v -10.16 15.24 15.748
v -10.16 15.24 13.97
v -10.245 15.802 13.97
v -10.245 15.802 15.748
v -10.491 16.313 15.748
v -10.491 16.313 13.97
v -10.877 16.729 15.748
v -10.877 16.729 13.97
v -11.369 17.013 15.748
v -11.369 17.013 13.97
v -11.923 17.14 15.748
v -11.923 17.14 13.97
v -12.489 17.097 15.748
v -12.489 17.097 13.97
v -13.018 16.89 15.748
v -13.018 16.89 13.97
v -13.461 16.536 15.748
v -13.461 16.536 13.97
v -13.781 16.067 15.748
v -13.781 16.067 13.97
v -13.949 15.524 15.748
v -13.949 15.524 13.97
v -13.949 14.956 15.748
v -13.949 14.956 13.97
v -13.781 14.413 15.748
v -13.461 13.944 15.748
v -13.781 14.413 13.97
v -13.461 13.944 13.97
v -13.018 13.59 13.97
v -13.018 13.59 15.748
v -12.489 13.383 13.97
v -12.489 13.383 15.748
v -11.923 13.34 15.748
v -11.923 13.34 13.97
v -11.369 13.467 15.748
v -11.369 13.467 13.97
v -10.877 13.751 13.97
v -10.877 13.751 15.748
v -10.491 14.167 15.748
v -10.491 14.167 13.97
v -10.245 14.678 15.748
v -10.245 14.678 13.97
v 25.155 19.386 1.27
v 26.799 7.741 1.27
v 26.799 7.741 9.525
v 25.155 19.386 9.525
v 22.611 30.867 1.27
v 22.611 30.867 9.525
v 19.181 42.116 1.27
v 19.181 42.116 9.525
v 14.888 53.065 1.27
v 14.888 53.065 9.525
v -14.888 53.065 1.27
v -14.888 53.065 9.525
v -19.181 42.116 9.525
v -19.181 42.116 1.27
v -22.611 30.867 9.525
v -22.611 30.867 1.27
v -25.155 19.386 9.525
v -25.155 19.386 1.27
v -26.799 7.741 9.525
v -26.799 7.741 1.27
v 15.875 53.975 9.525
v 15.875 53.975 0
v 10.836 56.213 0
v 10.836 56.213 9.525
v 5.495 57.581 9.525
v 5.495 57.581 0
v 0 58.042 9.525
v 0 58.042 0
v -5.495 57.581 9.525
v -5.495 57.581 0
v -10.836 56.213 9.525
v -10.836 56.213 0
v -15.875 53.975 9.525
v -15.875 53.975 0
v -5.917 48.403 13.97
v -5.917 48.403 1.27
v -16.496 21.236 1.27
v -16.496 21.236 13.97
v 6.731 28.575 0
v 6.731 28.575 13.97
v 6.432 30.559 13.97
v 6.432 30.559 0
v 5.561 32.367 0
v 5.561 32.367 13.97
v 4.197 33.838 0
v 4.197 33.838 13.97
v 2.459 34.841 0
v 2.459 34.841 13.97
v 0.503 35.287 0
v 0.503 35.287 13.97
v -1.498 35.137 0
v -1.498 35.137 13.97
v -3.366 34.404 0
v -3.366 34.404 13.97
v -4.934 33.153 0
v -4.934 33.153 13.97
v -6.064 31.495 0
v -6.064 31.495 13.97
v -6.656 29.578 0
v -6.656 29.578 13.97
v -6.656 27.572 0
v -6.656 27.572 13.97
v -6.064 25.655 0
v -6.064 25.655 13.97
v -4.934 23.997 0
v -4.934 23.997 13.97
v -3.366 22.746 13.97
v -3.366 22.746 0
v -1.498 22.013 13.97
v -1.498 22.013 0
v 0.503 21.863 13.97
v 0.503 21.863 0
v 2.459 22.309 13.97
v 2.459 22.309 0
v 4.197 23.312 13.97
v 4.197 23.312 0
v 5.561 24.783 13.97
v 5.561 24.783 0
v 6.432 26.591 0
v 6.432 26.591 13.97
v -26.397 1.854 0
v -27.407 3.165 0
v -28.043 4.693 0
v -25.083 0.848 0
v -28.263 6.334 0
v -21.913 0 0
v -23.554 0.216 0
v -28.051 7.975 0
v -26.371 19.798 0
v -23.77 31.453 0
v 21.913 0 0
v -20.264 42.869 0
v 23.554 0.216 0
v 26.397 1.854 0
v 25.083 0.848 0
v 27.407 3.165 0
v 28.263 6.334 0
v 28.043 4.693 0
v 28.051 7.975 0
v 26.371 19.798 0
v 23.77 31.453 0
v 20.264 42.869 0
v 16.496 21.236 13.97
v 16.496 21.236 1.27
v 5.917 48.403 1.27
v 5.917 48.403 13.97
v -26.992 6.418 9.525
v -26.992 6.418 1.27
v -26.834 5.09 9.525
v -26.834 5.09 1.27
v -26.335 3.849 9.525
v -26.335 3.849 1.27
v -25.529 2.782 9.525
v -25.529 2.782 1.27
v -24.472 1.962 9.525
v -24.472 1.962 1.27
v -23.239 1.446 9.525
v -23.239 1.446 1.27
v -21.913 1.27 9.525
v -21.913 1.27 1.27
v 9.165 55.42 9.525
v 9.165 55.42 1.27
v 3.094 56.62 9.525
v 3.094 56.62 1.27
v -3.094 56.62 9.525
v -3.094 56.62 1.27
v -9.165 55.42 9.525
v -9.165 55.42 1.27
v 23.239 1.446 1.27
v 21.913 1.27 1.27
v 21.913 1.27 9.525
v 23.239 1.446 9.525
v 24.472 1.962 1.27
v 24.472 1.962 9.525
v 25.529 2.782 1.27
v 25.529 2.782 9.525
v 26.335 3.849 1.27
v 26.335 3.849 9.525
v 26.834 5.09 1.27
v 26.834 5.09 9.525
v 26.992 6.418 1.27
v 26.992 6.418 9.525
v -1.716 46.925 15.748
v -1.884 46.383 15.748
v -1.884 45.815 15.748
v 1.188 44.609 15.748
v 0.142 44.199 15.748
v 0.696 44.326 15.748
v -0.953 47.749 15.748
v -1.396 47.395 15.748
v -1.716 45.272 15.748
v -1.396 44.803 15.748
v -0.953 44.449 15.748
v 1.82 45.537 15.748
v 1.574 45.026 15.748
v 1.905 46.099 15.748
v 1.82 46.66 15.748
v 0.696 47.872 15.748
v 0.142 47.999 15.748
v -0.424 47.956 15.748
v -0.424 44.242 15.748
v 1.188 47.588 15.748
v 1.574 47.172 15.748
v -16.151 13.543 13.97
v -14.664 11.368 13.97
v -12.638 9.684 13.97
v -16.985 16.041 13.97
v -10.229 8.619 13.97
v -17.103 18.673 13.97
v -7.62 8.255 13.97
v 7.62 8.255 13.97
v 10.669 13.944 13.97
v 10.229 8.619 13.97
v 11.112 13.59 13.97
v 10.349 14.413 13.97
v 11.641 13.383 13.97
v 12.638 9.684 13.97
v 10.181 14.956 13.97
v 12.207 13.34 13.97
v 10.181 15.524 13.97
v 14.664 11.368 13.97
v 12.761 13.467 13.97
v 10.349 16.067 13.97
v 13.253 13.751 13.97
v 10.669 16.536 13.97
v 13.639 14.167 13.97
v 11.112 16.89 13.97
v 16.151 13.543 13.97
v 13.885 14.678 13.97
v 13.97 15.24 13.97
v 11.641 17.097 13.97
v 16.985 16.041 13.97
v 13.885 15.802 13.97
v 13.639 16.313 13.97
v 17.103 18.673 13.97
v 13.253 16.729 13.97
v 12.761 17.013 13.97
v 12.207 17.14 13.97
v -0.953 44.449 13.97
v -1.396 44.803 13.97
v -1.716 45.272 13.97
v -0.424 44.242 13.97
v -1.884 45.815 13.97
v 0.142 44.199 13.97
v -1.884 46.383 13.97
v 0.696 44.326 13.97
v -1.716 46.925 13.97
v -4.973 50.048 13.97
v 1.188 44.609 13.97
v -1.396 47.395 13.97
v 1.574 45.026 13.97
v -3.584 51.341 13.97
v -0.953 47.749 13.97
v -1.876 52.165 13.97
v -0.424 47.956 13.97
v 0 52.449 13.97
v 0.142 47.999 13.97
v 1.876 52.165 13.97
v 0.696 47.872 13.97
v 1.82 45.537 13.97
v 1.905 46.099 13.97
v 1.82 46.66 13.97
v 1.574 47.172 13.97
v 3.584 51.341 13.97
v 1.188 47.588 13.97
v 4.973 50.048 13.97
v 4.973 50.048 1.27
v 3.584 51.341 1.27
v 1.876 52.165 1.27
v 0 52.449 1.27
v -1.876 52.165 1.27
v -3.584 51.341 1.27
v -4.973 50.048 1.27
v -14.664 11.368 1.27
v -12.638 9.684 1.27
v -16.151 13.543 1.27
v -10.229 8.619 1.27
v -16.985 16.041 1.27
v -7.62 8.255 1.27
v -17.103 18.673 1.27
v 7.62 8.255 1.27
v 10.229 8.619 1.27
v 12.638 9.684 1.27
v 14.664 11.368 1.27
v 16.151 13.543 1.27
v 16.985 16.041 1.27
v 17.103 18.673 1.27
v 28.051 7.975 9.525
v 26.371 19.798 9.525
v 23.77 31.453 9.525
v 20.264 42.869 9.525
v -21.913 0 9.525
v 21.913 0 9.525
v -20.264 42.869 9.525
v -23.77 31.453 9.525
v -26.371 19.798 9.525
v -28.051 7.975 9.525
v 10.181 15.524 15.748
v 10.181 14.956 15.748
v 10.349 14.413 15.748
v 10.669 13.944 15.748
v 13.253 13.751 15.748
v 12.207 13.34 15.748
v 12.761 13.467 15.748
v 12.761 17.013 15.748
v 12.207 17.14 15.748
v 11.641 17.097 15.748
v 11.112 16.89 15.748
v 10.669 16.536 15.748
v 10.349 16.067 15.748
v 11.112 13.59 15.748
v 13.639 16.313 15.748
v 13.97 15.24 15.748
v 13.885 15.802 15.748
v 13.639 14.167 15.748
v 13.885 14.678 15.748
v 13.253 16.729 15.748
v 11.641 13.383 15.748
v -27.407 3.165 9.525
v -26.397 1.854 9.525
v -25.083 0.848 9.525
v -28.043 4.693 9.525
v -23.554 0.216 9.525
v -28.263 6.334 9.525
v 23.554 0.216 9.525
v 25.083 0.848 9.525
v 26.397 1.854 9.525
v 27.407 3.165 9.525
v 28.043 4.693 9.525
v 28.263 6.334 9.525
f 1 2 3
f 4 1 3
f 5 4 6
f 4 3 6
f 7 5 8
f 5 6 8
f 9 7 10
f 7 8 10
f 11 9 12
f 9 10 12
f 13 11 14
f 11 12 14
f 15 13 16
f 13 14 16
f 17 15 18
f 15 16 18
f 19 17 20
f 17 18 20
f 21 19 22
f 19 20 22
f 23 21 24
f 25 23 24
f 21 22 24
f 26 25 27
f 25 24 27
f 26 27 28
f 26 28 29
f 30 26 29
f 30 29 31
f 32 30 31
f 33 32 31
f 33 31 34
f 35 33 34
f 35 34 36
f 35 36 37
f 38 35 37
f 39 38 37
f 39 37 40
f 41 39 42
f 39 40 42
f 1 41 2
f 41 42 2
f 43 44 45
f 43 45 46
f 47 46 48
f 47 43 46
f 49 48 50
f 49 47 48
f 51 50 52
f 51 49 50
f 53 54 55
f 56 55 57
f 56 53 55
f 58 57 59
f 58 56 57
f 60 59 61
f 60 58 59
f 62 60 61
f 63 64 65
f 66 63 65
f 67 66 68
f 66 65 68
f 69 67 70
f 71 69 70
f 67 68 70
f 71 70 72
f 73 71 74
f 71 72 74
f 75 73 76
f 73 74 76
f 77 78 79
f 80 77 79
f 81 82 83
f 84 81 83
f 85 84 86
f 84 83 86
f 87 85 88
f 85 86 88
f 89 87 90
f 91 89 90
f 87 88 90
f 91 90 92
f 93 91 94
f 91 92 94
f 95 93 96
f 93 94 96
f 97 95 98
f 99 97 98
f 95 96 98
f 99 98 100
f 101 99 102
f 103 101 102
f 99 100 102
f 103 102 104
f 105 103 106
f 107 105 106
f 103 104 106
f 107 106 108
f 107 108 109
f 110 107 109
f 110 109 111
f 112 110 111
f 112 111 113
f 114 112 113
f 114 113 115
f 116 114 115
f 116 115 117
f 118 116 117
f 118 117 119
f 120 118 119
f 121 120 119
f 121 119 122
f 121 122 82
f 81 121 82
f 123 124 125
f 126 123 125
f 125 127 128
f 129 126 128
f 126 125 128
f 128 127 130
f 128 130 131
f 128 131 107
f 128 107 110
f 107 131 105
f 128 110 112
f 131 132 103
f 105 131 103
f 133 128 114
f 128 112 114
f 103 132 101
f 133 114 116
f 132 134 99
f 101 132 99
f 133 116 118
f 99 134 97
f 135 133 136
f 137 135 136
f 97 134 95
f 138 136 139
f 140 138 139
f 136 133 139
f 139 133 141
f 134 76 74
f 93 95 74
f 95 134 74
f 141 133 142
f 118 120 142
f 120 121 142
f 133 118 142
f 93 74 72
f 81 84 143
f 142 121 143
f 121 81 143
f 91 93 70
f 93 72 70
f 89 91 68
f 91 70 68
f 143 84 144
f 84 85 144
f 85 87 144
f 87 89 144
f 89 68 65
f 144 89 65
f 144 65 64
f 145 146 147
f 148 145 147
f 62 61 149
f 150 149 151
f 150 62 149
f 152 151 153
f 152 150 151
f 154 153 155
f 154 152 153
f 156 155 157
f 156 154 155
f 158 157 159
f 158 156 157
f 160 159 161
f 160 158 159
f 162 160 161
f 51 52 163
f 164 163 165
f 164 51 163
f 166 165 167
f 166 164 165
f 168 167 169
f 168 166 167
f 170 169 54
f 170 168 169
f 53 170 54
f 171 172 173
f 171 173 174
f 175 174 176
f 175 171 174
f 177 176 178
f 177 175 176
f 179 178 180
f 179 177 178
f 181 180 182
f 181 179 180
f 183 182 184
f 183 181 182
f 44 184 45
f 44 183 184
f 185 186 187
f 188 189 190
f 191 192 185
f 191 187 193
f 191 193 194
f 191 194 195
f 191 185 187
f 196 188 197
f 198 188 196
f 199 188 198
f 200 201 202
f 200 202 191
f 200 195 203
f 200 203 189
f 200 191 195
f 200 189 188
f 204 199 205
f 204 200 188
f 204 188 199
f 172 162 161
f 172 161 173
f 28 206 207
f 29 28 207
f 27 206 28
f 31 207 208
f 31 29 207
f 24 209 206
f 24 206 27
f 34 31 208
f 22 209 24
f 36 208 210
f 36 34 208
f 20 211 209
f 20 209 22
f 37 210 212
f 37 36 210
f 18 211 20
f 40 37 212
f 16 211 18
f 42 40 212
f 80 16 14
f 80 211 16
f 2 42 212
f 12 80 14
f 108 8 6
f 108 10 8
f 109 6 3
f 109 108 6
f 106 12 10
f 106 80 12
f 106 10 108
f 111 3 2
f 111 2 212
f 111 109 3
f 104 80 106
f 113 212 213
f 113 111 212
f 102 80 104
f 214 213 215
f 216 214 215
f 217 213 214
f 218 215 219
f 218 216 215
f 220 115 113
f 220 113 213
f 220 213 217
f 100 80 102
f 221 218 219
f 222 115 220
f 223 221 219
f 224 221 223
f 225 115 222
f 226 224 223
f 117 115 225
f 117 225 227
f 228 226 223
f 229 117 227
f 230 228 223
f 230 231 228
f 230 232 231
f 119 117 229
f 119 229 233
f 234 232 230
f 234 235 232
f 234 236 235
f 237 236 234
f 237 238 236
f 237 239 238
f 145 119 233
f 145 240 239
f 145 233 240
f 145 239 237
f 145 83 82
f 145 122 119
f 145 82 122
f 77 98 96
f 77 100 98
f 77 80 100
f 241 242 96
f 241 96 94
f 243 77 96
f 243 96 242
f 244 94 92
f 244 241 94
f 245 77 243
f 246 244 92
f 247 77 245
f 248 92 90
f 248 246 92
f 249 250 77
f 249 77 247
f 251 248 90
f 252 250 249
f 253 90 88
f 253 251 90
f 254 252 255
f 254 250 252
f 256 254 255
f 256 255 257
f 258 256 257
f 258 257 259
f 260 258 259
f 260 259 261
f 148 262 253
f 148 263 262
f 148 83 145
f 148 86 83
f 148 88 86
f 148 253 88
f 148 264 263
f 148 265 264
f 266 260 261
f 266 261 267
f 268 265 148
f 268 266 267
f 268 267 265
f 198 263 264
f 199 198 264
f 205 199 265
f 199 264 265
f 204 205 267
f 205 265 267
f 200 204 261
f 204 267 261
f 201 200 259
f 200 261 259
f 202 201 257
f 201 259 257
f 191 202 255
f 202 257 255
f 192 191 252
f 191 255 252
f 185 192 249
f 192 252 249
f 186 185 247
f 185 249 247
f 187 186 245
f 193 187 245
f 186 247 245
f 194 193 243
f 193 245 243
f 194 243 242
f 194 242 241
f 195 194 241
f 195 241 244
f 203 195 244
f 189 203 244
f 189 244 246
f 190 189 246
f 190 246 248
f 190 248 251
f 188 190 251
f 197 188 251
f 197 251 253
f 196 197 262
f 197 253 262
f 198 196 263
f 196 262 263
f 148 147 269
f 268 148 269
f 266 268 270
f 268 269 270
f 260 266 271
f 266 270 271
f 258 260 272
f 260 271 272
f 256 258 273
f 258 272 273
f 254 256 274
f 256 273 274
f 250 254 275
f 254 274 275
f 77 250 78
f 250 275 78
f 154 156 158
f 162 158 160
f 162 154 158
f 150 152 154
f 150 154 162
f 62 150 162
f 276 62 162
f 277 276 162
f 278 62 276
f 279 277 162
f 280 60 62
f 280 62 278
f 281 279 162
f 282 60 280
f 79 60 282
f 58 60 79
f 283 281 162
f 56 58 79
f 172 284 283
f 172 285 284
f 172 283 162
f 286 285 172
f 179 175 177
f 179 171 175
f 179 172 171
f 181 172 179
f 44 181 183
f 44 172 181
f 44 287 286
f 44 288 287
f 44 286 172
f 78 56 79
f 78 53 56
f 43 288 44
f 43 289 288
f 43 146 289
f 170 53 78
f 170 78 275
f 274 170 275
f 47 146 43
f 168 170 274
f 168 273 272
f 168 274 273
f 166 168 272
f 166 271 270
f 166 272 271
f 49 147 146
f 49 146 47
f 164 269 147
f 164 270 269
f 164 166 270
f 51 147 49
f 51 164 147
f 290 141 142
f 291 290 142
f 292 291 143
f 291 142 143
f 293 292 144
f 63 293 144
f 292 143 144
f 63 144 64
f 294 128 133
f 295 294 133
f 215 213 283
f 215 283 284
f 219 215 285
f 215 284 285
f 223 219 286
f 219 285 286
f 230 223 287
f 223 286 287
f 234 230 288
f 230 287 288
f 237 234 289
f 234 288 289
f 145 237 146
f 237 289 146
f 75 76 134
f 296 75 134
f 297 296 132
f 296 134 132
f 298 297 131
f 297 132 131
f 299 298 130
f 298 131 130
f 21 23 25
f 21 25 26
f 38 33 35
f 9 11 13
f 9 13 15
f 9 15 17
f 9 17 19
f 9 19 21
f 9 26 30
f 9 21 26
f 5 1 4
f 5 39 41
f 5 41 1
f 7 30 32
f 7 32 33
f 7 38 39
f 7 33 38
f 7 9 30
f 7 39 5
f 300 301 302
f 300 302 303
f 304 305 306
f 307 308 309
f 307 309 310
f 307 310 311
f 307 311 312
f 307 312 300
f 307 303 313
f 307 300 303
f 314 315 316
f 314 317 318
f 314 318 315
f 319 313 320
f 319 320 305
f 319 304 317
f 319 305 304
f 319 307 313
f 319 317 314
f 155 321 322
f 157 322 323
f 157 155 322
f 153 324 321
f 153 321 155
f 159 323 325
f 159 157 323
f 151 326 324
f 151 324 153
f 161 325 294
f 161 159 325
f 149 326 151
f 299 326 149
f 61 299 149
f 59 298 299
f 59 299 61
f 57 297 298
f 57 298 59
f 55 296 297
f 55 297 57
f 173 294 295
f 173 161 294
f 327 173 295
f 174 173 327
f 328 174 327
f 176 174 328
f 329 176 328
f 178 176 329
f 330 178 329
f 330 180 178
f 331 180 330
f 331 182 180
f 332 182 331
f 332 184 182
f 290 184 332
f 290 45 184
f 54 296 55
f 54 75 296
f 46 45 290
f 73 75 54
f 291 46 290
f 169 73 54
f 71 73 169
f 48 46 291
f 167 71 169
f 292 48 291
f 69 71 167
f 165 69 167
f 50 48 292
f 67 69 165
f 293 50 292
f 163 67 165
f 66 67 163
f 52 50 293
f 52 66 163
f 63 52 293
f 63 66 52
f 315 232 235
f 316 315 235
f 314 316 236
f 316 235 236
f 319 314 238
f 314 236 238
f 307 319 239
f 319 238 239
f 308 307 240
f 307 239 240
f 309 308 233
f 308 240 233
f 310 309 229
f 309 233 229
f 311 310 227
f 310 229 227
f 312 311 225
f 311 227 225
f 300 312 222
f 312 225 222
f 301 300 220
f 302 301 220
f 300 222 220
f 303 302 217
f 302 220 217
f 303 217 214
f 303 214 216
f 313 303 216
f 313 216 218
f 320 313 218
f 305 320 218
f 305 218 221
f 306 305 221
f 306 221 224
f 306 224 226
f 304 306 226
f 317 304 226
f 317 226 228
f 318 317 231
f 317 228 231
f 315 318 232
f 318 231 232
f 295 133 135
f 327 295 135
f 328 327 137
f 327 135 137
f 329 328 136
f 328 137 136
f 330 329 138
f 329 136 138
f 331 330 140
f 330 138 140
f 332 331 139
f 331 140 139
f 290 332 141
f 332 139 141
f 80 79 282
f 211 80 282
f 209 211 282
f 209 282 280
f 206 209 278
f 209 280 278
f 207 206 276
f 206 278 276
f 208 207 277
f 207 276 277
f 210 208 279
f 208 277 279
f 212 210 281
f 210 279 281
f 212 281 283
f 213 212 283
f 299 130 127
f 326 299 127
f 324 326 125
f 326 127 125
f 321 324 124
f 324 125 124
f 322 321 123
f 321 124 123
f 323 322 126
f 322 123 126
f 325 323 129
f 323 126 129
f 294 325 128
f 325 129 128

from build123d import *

# Parameters (mm, degrees)
F1_DEPTH = 9.525
F2_T     = -1.27
F4_DEPTH = 12.7
F5_R     = 1.905
F6_DEPTH = 1.778
F5_R_2   = 6.731
F7_DEPTH = 13.971


with BuildPart() as f1:
    # F0 (on Top) → F1 (new body)
    with BuildSketch(Plane.XY):
        with BuildLine():
            ThreePointArc((-28.0514923582, 7.974917758), (-26.9448485688, 2.4767408919), (-21.9129141613, 0))
            Line((-21.9129141613, 0), (21.9129141613, 0))
            ThreePointArc((21.9129141613, 0), (26.9448485688, 2.4767408919), (28.0514923582, 7.974917758))
            ThreePointArc((28.0514923582, 7.974917758), (23.7696669498, 31.453129083), (15.875, 53.975))
            ThreePointArc((15.875, 53.975), (0, 58.0415066874), (-15.875, 53.975))
            ThreePointArc((-15.875, 53.975), (-23.7696669498, 31.453129083), (-28.0514923582, 7.974917758))
        make_face()
    extrude(amount=F1_DEPTH)

    # F2
    f2_openings = [f1.faces().sort_by_distance(p)[0] for p in [
        (0, 25.796964, 9.525),
    ]]
    offset(amount=F2_T, openings=f2_openings, kind=Kind.INTERSECTION)

    # F3 (on face) → F4 (join)
    with BuildSketch(Plane.XY.offset(1.27)):
        with BuildLine():
            Line((16.4958264334, 21.2362016904), (5.9172176222, 48.402988853))
            ThreePointArc((5.9172176222, 48.402988853), (0, 52.4488543928), (-5.9172176222, 48.402988853))
            Line((-5.9172176222, 48.402988853), (-16.4958263497, 21.2362019052))
            ThreePointArc((-16.4958263497, 21.2362019052), (-15.4827586809, 12.4038814256), (-7.62, 8.255))
            Line((-7.62, 8.255), (7.62, 8.255))
            ThreePointArc((7.62, 8.255), (15.4827586158, 12.4038813304), (16.4958264334, 21.2362016904))
        make_face()
    extrude(amount=F4_DEPTH)

    # F5 (on face) → F6 (join)
    with BuildSketch(Plane.XY.offset(13.97)):
        with Locations((0, 46.0988543928)):
            Circle(F5_R)
        with Locations((-12.065, 15.24)):
            Circle(F5_R)
        with Locations((12.065, 15.24)):
            Circle(F5_R)
    extrude(amount=F6_DEPTH)

    # F5 (on face) → F7 (cut, through all)
    with BuildSketch(Plane.XY.offset(13.97)):
        with Locations((0, 28.575)):
            Circle(F5_R_2)
    extrude(amount=-F7_DEPTH, mode=Mode.SUBTRACT)


solid = f1.part
